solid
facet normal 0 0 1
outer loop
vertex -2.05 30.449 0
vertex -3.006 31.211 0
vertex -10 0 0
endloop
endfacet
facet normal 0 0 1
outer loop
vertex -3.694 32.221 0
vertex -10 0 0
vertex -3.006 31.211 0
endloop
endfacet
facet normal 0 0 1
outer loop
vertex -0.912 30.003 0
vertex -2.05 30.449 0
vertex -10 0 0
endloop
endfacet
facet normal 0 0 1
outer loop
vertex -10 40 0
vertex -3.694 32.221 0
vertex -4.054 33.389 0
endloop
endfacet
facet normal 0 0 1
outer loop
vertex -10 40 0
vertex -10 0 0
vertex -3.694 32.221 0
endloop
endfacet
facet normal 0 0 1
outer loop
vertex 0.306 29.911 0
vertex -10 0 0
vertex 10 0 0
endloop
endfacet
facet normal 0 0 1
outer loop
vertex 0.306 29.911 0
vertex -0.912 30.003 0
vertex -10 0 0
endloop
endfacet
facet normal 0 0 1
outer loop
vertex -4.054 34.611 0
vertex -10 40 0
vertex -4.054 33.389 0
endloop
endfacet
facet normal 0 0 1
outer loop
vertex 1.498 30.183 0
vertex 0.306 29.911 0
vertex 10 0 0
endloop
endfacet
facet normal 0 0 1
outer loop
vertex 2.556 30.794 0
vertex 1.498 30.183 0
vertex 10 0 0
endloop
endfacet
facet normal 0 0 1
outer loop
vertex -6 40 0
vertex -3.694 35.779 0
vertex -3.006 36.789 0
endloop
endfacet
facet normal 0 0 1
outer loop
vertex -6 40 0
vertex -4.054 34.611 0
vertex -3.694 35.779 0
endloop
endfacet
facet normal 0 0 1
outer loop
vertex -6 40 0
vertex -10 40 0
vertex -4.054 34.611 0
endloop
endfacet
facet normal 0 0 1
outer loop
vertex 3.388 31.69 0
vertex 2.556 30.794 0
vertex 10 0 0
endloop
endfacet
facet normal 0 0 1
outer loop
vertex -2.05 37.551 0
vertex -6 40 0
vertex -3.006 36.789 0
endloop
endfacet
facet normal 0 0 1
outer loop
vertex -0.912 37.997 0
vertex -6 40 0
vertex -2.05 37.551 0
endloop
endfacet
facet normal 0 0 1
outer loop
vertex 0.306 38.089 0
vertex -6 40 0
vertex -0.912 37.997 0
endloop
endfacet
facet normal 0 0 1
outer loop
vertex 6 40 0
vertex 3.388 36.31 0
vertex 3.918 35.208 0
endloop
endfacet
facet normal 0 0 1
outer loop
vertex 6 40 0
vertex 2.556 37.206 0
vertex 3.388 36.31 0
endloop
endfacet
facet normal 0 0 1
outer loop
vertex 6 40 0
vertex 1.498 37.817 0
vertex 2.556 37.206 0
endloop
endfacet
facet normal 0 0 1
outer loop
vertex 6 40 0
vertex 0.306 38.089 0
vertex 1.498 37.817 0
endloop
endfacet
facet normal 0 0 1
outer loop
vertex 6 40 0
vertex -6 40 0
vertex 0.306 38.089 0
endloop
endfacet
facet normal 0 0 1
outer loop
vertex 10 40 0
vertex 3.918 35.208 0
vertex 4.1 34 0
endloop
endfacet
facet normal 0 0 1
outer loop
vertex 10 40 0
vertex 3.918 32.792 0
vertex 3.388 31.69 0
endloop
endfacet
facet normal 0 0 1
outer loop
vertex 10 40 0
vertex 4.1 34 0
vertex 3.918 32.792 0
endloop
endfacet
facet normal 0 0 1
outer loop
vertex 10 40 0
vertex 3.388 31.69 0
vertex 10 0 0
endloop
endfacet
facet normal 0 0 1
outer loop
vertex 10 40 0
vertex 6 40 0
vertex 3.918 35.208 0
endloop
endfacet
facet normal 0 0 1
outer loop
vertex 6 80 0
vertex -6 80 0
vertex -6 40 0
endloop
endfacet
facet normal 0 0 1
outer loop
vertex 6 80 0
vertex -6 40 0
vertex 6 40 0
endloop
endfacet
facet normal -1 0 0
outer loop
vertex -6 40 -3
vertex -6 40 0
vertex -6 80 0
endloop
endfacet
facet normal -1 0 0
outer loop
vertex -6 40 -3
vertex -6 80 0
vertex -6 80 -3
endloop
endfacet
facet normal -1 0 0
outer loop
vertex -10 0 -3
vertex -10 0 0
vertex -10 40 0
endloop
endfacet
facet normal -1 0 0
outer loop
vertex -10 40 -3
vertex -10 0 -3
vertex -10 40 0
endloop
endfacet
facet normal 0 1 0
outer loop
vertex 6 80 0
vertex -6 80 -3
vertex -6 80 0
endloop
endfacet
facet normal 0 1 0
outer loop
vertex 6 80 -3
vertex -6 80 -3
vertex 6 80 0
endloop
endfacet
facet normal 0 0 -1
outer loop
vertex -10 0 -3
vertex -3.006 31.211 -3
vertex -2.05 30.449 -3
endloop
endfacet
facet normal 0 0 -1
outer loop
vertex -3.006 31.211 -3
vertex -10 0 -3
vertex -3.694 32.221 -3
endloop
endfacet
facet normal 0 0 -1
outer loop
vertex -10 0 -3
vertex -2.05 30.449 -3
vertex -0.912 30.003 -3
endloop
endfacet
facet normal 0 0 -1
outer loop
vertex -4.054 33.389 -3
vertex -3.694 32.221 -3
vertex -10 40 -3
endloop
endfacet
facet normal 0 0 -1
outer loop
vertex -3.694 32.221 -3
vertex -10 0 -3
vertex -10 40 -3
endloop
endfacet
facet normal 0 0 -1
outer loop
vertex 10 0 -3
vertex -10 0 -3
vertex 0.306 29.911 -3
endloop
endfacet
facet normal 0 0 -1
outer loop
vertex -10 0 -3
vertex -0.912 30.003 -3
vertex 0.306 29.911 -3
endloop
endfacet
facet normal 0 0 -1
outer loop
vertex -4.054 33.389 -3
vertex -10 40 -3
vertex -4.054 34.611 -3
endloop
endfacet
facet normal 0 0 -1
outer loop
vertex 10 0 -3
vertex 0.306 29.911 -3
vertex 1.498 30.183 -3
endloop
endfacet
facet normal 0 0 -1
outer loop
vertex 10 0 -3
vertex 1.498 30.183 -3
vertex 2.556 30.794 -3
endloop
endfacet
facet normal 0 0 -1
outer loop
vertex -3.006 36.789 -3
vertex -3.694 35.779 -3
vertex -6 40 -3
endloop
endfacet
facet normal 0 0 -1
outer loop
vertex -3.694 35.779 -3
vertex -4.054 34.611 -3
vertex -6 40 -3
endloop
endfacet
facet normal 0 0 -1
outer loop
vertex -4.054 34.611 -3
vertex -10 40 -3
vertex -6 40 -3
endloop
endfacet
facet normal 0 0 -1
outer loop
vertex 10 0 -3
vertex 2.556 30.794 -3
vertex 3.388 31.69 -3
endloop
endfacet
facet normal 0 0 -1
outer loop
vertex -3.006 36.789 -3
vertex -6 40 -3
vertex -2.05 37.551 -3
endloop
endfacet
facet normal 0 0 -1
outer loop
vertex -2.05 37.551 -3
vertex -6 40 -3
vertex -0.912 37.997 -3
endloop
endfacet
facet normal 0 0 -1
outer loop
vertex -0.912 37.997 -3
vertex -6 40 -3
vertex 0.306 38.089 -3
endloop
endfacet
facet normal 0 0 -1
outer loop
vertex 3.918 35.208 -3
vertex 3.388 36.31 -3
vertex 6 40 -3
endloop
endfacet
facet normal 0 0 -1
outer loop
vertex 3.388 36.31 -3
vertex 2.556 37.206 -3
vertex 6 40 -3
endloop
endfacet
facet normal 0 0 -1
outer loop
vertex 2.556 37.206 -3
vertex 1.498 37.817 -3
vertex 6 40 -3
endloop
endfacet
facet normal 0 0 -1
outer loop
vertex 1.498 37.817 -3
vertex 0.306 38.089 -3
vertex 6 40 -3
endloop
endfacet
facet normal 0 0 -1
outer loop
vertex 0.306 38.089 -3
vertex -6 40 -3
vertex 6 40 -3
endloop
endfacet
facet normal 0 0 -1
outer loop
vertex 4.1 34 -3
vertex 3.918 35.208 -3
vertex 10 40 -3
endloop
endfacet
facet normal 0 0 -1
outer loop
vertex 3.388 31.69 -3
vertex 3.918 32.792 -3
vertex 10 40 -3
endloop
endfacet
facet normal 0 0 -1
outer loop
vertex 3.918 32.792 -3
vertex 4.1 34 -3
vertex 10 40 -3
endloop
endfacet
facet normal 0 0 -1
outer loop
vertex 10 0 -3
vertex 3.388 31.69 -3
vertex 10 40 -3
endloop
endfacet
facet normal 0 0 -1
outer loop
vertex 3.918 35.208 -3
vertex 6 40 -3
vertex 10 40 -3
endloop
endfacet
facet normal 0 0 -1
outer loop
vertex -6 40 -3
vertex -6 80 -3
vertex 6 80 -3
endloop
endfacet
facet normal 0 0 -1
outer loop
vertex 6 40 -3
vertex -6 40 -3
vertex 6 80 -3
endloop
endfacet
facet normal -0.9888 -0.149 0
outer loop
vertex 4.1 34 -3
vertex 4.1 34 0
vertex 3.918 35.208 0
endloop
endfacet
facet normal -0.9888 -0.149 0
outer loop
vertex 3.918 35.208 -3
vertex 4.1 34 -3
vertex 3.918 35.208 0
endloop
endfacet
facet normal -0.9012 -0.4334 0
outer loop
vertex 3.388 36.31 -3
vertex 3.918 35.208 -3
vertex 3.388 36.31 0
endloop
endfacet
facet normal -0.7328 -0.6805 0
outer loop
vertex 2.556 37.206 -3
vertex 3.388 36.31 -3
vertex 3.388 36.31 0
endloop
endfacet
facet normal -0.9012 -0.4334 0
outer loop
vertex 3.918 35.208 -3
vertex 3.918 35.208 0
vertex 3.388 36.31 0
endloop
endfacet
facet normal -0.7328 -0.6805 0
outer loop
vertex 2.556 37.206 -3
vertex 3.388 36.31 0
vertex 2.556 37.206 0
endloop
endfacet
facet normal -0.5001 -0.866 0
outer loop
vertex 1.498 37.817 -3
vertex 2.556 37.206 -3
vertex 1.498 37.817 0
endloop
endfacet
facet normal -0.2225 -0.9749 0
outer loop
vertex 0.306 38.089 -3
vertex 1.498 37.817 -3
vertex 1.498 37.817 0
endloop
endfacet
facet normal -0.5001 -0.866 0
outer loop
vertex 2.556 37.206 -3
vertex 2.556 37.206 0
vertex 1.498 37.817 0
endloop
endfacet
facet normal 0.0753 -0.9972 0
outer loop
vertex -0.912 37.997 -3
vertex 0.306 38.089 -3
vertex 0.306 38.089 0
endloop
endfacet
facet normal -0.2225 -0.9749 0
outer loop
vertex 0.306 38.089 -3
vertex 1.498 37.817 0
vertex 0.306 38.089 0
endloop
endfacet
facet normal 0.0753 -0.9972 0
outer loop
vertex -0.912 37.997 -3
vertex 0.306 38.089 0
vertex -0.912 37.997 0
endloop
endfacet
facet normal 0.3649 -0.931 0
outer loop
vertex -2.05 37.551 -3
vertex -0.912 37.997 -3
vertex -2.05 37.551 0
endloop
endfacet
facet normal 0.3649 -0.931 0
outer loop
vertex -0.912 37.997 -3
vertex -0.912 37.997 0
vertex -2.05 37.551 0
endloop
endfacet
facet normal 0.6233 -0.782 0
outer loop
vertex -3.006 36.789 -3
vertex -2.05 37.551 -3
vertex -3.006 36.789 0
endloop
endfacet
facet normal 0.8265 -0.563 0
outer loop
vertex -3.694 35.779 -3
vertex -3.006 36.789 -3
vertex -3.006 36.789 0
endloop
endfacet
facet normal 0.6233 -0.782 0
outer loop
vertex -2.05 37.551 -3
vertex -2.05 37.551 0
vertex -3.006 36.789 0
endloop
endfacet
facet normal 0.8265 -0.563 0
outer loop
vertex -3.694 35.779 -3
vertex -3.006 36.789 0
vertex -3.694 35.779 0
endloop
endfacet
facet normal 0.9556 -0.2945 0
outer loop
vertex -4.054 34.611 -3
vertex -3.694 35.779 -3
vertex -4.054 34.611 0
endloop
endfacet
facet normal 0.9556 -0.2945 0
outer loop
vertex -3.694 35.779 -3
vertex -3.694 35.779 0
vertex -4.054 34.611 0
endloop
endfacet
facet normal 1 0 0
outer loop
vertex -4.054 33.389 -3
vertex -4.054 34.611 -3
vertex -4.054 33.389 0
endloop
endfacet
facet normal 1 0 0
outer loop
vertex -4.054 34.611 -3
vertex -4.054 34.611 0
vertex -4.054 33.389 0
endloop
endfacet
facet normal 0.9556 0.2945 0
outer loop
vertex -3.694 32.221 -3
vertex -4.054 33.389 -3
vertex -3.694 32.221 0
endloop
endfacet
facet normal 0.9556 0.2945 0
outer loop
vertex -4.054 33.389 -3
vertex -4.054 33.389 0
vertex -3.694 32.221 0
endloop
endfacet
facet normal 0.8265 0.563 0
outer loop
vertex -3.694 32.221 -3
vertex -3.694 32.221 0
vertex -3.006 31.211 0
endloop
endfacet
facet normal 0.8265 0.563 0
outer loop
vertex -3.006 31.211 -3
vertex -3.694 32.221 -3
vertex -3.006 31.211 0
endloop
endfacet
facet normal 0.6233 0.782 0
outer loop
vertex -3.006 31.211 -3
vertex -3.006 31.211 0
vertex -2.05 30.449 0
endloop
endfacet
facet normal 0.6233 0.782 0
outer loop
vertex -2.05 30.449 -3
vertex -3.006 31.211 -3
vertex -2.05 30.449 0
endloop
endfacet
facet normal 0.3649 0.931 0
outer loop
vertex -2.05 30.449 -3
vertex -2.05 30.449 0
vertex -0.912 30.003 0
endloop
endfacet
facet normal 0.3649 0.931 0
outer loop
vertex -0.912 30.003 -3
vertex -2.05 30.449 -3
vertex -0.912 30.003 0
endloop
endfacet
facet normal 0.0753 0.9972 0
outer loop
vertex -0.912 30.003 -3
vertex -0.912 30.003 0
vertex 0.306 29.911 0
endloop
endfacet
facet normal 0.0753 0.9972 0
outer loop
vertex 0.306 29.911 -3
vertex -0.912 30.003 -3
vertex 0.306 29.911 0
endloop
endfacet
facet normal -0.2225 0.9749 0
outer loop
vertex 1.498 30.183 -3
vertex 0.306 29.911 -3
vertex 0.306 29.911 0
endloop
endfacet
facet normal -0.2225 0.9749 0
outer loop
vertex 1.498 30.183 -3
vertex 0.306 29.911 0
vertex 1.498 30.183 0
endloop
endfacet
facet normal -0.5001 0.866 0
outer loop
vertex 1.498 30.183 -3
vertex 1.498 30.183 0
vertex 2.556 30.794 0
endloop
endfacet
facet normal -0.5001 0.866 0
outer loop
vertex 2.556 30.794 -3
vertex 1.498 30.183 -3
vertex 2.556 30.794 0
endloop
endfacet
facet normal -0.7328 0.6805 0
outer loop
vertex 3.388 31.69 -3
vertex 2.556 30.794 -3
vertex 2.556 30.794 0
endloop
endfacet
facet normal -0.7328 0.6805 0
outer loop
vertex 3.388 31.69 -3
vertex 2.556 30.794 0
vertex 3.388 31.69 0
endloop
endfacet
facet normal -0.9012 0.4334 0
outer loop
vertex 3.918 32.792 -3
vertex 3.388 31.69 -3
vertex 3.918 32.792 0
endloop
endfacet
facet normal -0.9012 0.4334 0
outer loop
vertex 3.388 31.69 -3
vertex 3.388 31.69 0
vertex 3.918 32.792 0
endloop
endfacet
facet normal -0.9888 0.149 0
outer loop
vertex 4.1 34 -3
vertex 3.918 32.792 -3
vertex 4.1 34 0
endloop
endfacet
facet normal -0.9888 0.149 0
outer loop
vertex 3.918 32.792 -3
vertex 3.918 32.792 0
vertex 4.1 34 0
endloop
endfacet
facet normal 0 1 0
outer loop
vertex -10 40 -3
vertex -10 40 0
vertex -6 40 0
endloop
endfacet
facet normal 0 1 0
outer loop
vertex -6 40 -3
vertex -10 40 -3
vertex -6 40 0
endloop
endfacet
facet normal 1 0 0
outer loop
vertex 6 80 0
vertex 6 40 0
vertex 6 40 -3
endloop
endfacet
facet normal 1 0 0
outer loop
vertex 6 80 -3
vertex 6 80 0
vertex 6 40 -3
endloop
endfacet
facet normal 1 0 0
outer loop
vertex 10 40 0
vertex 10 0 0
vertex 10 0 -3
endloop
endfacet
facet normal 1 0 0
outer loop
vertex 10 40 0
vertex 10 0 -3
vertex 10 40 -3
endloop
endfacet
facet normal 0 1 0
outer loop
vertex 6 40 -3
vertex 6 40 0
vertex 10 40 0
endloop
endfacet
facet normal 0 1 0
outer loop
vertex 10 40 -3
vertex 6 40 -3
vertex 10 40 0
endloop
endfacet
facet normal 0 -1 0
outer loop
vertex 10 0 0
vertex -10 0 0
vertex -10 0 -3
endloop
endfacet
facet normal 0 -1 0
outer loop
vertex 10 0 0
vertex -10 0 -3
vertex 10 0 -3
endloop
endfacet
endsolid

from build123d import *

# Parameters (mm, degrees)
SKETCH1_W           = 20
SKETCH1_H           = 40
BOSS_EXTRUDE1_DEPTH = 3
SKETCH2_R           = 4.1
CUT_EXTRUDE1_DEPTH  = 3
SKETCH3_W           = 12
SKETCH3_H           = 3
BOSS_EXTRUDE2_DEPTH = 40


with BuildPart() as part:
    # Sketch1 → Boss-Extrude1 (new body)
    with BuildSketch(Plane.XY):
        with Locations((0, 20)):
            Rectangle(SKETCH1_W, SKETCH1_H)
    extrude(amount=-BOSS_EXTRUDE1_DEPTH)

    # Sketch2 → Cut-Extrude1 (cut)
    with BuildSketch(Plane.XY):
        with Locations((0, 34)):
            Circle(SKETCH2_R)
    extrude(amount=-CUT_EXTRUDE1_DEPTH, mode=Mode.SUBTRACT)

    # Sketch3 → Boss-Extrude2 (add)
    with BuildSketch(Plane(origin=(0, 40, 0), x_dir=(1, 0, 0), z_dir=(0, 1, 0))):
        with Locations((0, 1.5)):
            Rectangle(SKETCH3_W, SKETCH3_H)
    extrude(amount=BOSS_EXTRUDE2_DEPTH)


solid = part.part
